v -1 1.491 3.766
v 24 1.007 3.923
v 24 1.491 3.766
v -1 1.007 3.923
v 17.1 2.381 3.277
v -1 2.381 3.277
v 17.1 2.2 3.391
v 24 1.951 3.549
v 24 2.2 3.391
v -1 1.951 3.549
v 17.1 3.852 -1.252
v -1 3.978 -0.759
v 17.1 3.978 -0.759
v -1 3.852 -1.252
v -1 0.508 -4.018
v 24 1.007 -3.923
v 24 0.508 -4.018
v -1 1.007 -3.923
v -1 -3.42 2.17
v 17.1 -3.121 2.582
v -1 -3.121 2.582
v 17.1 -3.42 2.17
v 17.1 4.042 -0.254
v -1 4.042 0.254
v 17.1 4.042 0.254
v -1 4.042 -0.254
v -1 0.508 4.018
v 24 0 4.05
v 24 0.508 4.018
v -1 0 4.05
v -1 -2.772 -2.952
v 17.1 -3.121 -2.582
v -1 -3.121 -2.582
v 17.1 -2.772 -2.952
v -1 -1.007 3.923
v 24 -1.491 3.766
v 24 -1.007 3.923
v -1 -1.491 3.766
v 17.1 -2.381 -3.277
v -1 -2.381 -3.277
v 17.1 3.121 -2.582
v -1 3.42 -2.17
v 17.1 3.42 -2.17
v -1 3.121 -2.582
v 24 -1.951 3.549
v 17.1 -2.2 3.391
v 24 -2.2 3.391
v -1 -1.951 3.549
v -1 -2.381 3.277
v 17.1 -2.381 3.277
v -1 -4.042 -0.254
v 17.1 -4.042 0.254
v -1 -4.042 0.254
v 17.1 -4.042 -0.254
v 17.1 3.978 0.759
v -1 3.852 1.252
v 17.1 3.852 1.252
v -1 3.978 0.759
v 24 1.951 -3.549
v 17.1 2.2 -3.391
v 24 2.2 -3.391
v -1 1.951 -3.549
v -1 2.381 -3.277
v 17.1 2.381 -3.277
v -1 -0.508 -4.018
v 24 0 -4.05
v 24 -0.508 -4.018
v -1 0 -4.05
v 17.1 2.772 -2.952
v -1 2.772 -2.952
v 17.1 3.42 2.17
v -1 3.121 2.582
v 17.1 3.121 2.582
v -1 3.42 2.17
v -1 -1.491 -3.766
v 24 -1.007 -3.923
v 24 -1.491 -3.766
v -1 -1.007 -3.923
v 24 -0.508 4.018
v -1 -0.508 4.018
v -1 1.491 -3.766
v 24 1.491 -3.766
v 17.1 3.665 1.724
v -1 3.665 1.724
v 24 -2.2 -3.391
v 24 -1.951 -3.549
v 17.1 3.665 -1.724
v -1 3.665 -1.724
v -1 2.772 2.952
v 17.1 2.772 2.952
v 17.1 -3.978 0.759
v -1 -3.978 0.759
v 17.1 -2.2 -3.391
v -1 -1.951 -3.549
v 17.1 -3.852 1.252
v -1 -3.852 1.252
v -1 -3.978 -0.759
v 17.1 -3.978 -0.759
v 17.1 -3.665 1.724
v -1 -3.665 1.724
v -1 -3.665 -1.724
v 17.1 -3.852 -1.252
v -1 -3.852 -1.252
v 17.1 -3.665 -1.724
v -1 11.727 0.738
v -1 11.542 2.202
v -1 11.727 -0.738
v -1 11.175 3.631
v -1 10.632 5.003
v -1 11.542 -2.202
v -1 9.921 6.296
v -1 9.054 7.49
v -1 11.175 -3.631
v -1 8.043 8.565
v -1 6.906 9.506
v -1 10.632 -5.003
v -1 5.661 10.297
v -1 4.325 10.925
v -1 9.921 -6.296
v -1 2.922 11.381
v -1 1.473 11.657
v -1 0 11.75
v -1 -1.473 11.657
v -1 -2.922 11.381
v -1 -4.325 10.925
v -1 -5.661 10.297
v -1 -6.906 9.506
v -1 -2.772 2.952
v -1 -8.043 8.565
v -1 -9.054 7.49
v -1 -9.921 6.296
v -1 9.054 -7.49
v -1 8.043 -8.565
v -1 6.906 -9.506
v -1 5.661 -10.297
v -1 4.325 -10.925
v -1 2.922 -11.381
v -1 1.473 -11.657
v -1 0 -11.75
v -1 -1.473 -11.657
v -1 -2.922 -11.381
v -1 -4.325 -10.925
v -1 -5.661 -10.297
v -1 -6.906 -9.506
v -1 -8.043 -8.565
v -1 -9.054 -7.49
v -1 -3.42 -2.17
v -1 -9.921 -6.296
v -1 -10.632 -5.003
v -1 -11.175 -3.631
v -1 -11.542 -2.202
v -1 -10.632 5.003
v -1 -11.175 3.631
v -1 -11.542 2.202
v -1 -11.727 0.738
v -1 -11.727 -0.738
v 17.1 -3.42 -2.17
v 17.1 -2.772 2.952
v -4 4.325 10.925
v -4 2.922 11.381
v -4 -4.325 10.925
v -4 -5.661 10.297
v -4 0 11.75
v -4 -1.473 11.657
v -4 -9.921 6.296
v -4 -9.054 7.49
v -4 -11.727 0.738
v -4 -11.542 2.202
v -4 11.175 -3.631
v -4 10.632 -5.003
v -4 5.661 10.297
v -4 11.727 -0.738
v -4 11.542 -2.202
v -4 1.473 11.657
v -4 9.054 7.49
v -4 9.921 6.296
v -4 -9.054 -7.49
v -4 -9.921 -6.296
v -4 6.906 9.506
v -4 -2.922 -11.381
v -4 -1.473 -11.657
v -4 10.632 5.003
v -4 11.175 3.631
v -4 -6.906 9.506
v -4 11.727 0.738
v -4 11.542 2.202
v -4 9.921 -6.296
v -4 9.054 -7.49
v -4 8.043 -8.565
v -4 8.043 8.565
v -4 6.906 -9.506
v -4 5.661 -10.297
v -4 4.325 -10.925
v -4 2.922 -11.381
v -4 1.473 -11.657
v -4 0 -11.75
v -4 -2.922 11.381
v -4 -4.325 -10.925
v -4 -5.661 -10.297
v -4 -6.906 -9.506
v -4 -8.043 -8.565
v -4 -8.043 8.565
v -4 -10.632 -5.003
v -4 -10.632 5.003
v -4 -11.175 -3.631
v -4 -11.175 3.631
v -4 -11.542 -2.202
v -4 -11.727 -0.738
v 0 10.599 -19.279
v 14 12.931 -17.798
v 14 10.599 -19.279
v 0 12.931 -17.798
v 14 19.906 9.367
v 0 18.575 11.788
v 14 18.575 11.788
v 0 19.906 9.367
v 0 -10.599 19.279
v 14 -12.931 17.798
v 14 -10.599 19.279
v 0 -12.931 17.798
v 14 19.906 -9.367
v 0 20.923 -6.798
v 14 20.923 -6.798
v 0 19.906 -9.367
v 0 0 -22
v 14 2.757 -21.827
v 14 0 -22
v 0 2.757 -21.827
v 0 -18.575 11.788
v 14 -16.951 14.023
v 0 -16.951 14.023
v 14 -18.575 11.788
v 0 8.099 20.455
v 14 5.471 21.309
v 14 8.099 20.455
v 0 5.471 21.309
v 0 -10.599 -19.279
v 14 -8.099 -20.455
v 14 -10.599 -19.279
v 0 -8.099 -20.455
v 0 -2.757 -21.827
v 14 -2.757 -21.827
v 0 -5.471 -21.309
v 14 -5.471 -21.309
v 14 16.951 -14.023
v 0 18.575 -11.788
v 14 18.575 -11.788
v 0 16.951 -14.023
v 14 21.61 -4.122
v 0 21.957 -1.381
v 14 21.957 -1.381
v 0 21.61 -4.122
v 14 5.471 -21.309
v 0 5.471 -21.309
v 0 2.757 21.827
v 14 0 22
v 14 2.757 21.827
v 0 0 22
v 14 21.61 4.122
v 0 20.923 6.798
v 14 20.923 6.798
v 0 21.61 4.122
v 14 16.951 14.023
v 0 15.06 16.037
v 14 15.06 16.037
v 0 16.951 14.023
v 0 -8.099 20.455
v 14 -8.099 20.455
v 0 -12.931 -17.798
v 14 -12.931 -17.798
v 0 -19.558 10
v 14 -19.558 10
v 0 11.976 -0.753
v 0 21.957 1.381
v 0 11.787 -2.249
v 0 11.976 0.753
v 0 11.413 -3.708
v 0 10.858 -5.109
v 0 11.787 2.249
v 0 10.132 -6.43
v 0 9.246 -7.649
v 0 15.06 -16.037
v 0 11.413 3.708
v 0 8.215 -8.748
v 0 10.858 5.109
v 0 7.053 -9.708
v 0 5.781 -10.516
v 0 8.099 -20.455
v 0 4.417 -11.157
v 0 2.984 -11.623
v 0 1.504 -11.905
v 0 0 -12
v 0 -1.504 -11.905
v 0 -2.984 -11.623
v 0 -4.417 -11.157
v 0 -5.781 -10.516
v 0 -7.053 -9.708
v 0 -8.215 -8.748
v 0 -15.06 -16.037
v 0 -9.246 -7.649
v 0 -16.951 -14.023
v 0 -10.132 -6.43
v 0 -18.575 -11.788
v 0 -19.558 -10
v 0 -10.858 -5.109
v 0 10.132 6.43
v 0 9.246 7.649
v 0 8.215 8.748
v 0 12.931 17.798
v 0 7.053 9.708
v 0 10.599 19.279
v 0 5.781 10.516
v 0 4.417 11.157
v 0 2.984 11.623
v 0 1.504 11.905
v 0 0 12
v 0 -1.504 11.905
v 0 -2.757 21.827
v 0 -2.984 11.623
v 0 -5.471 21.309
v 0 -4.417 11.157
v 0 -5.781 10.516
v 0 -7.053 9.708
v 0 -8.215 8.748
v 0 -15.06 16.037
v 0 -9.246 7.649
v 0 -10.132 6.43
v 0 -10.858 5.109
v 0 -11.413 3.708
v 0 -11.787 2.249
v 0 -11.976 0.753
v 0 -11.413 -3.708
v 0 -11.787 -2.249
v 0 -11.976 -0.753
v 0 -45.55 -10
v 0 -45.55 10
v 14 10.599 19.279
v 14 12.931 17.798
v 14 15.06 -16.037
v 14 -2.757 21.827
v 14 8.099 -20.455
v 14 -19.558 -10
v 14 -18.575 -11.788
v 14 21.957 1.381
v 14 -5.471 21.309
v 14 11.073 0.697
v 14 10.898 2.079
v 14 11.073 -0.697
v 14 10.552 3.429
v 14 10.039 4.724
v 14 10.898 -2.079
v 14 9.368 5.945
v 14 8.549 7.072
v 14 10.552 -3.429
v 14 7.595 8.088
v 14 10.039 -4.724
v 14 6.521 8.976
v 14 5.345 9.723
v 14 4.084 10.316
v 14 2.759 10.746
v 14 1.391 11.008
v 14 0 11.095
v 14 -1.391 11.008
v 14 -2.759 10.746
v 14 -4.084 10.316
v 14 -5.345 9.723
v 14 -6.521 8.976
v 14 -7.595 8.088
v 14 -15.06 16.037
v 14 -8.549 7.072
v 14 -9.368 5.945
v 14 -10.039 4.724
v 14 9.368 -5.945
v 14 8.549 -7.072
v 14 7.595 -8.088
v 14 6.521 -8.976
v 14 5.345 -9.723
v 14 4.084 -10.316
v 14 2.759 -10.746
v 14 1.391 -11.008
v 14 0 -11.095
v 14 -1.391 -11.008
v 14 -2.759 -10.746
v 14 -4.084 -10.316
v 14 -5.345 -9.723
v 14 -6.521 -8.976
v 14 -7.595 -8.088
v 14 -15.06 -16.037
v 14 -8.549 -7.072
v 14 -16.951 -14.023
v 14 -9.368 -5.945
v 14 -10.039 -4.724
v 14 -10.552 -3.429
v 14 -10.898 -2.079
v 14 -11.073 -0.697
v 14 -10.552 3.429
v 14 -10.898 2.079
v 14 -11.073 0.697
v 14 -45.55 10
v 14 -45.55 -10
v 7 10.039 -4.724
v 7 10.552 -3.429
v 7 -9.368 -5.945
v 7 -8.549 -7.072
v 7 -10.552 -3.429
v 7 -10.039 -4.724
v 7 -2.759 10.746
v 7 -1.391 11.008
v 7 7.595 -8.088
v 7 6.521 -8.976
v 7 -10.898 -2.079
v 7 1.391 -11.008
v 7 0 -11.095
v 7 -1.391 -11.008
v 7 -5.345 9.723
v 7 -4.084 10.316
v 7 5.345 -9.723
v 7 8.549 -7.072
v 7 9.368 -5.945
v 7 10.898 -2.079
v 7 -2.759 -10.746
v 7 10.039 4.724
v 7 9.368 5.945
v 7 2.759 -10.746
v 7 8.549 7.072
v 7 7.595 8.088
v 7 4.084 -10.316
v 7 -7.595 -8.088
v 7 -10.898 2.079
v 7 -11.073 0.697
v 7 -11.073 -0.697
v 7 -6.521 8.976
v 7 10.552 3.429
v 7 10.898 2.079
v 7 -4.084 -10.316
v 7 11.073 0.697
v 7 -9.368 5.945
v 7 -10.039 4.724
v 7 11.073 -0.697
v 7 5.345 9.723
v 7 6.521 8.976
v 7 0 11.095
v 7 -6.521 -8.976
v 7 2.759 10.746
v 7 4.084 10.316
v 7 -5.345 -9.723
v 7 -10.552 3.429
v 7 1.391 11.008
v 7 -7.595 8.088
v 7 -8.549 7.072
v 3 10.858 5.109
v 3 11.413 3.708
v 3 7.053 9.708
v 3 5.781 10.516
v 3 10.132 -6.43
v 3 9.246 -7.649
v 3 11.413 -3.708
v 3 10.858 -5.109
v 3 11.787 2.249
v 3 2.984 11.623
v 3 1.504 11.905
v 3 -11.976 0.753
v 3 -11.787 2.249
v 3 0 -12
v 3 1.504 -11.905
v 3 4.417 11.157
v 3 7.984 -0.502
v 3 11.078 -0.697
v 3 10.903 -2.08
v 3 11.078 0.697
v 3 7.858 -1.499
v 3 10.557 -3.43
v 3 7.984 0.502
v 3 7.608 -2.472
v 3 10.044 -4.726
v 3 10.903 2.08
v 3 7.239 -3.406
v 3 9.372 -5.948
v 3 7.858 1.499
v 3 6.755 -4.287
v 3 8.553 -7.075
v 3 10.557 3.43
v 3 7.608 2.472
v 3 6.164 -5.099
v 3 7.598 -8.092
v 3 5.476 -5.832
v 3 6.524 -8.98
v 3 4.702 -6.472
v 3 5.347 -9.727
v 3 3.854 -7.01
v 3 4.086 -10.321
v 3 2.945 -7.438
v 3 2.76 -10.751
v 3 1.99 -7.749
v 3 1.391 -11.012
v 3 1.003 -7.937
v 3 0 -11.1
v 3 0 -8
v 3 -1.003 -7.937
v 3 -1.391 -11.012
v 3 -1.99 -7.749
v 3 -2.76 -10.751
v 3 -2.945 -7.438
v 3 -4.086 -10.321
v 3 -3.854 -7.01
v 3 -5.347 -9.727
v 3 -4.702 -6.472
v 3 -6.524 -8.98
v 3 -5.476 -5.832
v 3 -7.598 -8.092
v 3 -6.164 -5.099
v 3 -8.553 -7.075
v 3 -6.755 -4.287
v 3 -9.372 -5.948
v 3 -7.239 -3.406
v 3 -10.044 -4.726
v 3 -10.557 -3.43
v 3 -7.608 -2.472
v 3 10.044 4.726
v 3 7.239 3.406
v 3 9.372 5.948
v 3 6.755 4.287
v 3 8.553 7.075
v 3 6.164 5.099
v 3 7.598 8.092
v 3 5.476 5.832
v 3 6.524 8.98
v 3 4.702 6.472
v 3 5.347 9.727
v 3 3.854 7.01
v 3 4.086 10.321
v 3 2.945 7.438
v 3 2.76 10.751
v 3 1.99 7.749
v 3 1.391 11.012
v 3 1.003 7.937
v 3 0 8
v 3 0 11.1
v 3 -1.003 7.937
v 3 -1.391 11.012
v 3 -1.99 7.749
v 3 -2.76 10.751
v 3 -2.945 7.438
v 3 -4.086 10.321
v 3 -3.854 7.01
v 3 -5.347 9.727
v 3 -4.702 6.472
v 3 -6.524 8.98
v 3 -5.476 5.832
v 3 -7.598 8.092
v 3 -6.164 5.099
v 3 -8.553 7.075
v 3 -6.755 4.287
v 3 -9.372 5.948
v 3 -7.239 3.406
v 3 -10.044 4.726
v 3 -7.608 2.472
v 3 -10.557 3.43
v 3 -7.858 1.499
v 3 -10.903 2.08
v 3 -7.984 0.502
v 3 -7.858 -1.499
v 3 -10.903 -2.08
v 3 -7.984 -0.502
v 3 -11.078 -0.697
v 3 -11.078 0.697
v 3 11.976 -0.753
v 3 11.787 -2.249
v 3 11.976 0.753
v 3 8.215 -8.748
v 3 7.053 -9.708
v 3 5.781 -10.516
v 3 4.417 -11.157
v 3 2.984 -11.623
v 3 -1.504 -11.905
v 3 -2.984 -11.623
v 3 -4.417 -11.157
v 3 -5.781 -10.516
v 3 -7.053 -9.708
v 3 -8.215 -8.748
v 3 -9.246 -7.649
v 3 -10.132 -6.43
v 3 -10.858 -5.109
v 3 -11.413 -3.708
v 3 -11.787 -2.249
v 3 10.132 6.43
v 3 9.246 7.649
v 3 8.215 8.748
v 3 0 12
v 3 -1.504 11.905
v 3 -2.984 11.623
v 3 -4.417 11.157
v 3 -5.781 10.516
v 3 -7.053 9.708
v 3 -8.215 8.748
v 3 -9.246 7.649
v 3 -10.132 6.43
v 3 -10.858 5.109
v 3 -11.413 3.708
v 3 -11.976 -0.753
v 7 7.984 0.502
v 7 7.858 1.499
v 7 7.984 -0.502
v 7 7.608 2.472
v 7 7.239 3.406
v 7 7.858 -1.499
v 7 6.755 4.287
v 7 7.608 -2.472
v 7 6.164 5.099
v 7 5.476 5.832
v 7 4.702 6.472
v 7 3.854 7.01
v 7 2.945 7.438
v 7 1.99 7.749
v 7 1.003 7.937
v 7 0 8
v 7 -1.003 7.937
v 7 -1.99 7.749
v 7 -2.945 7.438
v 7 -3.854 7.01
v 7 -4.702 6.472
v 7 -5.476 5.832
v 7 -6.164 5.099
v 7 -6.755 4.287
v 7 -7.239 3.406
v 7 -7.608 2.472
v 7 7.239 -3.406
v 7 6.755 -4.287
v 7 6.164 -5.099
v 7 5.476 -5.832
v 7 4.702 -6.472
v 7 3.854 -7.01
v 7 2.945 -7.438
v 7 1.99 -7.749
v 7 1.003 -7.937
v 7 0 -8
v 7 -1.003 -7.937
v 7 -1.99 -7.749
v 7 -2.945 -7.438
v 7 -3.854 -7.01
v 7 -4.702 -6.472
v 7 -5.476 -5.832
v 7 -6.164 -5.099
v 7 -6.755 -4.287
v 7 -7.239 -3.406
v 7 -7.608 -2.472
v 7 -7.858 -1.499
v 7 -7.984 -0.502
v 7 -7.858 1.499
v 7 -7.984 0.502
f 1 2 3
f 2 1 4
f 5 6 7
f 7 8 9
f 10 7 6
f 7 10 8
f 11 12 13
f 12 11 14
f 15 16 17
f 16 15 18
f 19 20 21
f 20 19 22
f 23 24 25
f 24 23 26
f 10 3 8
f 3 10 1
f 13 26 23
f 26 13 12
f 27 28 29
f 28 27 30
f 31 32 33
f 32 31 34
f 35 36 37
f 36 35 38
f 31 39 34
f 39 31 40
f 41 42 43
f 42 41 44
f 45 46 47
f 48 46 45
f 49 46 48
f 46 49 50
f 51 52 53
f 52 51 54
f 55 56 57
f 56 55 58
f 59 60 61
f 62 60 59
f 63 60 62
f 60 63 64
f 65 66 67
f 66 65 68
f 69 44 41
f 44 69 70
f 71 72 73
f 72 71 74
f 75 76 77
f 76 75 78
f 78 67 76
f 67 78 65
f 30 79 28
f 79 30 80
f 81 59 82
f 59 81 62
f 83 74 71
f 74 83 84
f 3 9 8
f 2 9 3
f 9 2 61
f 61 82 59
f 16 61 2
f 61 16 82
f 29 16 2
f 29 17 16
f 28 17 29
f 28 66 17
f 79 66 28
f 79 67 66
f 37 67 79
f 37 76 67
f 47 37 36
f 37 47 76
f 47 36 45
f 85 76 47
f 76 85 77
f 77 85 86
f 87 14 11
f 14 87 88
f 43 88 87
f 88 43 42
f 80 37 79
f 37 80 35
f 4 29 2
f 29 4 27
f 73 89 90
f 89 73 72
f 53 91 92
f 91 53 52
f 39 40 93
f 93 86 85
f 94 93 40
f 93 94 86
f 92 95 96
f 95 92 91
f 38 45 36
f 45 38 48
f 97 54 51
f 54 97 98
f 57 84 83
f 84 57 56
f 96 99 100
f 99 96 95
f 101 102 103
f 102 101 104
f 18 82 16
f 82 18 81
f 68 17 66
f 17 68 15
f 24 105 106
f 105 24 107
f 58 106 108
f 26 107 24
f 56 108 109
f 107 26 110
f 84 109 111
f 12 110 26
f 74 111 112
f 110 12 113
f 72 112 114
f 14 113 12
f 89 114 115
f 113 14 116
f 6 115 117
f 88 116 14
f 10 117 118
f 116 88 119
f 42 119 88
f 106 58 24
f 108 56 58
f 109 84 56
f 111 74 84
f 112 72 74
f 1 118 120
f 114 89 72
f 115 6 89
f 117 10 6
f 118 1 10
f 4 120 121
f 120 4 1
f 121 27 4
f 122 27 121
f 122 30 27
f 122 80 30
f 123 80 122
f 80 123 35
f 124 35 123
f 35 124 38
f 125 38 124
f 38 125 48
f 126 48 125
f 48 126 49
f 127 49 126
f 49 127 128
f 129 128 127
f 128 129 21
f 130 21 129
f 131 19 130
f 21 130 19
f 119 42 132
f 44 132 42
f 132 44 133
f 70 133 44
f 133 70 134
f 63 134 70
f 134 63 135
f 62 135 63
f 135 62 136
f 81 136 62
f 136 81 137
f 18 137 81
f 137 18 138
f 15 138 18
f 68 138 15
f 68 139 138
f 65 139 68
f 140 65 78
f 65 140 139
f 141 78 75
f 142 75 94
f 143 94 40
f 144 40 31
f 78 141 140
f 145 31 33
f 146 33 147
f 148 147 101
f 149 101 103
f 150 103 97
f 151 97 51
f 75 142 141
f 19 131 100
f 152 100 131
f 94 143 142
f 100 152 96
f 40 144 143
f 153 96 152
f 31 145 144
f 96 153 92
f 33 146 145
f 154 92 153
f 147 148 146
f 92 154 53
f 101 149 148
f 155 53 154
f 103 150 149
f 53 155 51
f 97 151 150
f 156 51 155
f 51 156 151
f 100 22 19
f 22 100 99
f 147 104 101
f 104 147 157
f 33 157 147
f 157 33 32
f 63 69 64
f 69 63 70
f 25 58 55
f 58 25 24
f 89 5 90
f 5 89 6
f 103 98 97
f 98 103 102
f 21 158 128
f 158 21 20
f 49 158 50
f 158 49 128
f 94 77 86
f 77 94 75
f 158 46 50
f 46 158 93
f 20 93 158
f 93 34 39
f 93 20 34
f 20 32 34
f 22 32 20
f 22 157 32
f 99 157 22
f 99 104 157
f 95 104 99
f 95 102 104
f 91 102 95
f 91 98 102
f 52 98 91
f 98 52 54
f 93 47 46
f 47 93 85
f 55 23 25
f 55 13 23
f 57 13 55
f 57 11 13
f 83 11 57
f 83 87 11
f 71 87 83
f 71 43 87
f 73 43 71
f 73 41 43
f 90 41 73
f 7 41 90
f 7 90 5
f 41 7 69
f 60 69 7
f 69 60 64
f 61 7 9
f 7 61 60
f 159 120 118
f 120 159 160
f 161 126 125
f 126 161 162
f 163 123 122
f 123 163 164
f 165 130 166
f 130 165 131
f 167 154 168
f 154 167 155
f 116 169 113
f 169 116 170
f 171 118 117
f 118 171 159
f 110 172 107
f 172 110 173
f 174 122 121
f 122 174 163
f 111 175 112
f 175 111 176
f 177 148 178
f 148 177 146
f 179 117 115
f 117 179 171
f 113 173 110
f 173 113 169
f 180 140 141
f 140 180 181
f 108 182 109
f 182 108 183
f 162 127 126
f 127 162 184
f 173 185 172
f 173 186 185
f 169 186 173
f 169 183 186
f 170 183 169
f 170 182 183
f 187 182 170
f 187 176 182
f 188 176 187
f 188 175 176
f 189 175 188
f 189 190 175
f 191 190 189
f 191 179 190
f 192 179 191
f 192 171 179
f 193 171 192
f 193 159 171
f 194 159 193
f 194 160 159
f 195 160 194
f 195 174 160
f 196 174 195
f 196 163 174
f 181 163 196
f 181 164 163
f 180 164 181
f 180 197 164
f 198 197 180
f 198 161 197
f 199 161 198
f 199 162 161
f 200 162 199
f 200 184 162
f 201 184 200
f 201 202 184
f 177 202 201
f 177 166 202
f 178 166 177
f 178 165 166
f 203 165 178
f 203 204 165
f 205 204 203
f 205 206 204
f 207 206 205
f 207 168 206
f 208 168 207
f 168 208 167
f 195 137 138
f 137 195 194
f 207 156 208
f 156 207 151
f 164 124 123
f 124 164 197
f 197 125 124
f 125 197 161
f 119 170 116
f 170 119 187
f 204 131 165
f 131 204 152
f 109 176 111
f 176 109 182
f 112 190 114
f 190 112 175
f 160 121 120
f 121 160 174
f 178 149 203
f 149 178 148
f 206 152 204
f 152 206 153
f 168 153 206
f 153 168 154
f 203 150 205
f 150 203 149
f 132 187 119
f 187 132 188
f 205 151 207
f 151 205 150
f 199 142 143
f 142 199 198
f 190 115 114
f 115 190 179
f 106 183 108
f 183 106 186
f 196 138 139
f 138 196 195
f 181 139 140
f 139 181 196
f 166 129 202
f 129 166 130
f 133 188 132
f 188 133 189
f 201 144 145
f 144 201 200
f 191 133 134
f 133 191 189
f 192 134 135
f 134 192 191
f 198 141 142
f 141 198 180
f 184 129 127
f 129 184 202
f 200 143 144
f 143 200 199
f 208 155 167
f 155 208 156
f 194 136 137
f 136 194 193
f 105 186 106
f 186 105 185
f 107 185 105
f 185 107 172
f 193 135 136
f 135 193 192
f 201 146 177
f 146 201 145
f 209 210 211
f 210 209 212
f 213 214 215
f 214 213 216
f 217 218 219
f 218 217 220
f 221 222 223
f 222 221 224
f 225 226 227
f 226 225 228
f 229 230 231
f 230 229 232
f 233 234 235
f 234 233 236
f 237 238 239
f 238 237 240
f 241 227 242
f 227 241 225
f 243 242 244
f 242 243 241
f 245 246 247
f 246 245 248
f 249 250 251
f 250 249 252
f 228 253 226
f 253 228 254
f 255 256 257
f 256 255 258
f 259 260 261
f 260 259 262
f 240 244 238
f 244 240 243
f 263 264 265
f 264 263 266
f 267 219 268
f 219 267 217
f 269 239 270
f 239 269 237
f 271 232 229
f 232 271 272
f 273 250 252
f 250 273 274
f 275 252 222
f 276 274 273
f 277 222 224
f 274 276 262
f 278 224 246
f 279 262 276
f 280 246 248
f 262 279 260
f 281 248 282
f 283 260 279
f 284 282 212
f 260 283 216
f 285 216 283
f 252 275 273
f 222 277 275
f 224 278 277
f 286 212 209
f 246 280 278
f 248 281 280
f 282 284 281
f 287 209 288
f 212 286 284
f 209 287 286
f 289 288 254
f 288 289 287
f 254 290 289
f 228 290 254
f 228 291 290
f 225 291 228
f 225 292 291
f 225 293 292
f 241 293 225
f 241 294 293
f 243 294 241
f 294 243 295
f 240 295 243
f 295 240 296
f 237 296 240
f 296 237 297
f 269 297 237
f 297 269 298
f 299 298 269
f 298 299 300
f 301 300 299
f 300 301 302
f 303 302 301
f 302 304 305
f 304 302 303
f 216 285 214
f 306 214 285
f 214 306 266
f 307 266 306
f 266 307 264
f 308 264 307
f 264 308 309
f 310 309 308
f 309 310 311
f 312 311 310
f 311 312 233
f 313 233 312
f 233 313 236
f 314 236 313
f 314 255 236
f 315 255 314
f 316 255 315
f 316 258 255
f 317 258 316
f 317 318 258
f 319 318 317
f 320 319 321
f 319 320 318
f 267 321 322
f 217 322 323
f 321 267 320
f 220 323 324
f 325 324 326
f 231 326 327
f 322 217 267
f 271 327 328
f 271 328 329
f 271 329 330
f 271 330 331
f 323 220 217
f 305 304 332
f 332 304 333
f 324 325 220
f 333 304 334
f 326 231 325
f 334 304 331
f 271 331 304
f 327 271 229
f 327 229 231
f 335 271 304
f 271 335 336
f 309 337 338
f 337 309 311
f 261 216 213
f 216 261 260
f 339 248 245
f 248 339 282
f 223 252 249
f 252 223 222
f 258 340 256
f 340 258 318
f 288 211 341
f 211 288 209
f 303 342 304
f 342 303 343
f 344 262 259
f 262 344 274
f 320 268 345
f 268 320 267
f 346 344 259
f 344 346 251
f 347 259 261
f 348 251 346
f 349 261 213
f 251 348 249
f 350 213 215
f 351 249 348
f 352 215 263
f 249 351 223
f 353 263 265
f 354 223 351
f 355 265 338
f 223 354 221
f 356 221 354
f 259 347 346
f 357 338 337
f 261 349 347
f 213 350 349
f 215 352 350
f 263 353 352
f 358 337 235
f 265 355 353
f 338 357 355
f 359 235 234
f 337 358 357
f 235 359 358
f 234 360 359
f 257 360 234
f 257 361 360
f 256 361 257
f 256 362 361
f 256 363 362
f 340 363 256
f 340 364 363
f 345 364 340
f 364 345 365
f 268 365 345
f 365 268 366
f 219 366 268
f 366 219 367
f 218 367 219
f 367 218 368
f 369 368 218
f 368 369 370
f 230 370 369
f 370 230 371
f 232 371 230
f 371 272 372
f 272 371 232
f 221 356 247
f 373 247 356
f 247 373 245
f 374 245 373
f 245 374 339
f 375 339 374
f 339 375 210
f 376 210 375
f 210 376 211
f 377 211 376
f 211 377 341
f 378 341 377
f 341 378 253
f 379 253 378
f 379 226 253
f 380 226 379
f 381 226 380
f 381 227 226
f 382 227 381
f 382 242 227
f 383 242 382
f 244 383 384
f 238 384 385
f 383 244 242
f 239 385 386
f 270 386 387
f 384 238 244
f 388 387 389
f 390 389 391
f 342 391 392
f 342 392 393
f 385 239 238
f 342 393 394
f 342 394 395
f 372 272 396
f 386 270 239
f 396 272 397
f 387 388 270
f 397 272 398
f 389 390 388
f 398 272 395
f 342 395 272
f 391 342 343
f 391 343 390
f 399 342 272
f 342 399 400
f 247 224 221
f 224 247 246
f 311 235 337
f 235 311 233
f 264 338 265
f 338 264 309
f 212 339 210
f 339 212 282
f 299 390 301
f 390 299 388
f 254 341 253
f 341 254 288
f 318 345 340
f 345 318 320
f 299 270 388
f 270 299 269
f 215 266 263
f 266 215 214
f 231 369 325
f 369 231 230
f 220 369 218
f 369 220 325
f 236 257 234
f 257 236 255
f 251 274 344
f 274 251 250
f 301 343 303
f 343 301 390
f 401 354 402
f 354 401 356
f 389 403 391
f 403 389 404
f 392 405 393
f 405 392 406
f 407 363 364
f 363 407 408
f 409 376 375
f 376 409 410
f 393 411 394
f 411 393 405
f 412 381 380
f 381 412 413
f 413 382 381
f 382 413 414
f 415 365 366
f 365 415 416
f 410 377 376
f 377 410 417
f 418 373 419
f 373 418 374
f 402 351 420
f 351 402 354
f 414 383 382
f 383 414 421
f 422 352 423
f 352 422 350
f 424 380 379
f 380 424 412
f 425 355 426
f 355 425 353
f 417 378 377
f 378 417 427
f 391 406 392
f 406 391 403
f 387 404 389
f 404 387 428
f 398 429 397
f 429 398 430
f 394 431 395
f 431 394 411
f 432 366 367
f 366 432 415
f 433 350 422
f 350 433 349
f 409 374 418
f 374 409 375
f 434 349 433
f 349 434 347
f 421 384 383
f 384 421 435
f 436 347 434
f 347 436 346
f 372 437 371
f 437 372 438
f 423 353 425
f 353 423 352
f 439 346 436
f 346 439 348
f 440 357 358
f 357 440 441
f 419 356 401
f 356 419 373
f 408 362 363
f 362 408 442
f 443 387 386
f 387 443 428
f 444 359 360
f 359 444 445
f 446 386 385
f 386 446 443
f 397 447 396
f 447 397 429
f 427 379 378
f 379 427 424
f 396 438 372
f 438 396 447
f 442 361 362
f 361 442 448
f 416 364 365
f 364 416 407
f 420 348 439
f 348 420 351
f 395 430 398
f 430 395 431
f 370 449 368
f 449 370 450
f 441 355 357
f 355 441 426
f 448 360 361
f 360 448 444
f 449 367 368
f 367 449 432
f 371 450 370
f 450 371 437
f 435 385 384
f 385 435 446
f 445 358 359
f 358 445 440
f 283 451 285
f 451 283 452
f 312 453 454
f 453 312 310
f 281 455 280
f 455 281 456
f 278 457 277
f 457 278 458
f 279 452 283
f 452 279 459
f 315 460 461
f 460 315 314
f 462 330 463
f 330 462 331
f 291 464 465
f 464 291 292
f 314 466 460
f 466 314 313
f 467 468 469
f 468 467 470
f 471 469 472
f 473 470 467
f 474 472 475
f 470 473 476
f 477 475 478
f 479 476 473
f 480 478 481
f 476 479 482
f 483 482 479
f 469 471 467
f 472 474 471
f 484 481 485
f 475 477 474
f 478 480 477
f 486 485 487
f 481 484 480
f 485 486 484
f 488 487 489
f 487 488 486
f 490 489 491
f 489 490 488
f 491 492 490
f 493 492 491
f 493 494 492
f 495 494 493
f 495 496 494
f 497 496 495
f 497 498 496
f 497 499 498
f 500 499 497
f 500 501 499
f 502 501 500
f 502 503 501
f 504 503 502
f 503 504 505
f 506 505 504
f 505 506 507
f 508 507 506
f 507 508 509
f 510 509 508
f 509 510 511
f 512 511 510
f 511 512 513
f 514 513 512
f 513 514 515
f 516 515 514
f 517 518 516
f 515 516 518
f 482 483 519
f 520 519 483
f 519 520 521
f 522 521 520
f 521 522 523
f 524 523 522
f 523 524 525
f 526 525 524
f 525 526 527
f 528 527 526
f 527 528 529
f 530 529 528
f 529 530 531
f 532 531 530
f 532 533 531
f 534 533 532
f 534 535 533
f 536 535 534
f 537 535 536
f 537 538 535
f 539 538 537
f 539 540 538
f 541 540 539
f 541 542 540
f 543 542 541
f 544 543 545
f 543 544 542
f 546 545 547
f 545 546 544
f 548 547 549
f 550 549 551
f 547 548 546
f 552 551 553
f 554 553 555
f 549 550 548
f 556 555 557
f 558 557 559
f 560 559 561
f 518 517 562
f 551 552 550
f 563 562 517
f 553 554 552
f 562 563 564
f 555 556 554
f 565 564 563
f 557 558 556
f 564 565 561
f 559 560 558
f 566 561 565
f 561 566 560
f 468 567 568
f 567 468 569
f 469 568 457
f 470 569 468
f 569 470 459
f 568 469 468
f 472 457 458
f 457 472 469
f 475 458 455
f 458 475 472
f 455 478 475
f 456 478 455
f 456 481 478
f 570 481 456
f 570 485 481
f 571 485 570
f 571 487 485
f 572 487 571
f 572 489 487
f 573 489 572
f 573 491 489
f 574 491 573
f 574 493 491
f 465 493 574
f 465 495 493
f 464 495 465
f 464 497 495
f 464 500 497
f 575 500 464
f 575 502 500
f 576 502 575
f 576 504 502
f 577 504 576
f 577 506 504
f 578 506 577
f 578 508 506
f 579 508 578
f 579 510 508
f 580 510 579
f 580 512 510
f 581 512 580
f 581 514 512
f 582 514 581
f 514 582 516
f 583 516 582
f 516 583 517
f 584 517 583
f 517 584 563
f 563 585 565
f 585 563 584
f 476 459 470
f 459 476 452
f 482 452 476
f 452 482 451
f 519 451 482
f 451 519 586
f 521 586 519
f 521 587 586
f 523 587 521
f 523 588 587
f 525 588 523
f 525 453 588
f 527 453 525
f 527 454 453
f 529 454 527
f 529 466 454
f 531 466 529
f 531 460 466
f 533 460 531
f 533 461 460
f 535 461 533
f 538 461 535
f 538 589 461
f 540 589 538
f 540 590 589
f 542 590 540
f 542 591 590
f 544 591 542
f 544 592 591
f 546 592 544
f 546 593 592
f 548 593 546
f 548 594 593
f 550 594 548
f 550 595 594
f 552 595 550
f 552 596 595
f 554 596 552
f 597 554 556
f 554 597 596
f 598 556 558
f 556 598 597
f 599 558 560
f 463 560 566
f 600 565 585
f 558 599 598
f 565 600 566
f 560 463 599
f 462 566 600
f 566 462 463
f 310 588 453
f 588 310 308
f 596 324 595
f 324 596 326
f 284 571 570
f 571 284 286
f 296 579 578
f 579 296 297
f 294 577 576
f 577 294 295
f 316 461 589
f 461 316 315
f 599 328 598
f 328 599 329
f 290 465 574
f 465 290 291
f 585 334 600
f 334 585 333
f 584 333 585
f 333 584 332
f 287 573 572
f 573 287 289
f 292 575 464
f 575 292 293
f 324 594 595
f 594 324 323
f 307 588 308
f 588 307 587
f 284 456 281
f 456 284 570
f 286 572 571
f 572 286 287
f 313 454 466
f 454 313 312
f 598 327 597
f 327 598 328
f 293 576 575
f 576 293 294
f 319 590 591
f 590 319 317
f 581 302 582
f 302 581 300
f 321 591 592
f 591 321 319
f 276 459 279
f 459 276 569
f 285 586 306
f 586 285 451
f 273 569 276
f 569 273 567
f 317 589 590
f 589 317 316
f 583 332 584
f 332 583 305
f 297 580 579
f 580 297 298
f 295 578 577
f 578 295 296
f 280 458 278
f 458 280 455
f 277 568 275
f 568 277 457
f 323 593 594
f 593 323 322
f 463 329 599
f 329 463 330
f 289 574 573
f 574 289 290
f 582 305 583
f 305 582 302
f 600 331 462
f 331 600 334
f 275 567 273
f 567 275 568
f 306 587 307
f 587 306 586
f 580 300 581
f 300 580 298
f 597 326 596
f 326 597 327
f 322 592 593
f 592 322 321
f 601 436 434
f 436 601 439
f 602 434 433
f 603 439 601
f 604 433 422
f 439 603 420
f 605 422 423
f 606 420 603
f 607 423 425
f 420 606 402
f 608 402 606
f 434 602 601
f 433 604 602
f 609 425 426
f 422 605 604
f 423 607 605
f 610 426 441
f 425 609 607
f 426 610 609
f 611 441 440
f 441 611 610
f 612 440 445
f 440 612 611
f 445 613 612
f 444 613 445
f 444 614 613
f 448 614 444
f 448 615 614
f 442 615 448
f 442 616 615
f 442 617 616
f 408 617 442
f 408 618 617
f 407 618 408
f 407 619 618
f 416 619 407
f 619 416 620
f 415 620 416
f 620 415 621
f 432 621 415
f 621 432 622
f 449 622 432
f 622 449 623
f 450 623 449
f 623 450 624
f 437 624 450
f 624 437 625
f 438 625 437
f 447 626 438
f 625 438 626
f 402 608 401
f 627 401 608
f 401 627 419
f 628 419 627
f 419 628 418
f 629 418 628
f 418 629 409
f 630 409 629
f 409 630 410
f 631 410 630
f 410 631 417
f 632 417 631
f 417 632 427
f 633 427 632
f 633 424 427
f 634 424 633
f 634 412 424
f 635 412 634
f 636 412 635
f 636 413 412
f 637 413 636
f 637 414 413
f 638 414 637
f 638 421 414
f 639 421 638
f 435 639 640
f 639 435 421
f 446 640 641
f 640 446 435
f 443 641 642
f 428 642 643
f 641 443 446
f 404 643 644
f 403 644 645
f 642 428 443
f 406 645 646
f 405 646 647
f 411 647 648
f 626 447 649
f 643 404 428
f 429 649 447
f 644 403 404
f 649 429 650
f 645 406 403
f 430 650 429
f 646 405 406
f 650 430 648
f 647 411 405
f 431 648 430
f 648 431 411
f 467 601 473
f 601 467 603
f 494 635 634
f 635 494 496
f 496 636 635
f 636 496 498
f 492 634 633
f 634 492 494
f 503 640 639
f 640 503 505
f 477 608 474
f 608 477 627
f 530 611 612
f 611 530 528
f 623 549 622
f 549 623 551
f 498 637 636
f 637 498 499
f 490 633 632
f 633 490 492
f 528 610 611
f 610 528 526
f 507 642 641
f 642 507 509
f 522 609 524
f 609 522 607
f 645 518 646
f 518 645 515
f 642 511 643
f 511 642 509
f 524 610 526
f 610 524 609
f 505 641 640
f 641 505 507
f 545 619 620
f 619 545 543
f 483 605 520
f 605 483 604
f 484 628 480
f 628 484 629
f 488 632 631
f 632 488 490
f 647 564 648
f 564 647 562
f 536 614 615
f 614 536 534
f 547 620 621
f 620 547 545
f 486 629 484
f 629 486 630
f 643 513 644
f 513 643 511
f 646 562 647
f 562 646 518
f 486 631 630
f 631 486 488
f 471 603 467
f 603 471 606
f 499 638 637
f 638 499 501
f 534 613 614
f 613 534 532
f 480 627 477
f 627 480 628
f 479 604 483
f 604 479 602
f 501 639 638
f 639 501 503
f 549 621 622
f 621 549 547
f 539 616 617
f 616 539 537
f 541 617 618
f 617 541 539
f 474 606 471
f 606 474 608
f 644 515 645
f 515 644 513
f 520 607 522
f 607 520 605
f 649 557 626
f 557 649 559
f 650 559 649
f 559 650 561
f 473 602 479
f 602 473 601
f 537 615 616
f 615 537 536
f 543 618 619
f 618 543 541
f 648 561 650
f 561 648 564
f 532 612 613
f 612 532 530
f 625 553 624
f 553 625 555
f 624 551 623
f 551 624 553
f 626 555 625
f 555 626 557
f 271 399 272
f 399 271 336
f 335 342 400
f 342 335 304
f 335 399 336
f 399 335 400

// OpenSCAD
// file: ../spring_library.scad
/**
* An edge (or line) between 2 nodes
*/
module line(start, end, d, fn=4) {
  hull() {
    node(start,d, fn);
    node(end,d, fn);
  }      
}

/**
* A single node which is connected by edges
*/
module node(pos, d, fn=4) {
  if (pos[0]!=undef && pos[1] != undef && pos[2] != undef){ 
    translate(pos) sphere(d=d, $fn = fn);    
  }
}

/**
* Basic logic for generating a 3d spring
*/ 
module spring(d, dBottom=6, dTop=6, windings=2, height=10, steps=10, wireDiameter=1,fn=10) {
    // we use either d or dBottom&dTop
    r0 = d != undef ? d/2 : dBottom/2;
    r1 = d != undef ?d/2 : dTop/2;
    
    rx = (r0-r1) / (360.0*windings);    
    heightPerDegree = height/windings/360;
    
    for ( angle = [steps : steps : 360*windings] ){
        r = r0 - (angle * rx); 
        x0=r*cos(angle-steps);
        y0=r*sin(angle-steps);
        z0=(angle-steps)*heightPerDegree;
        x=r*cos(angle);
        y=r*sin(angle);
        z=angle*heightPerDegree;

        line([x0,y0,z0],[x,y,z],d=wireDiameter,fn=fn);        
    }
}

/**
* 3D Spring with identical diameter at top and bottom. The top and boton might
* start with a flat circle
*/
module spring3D(d=5,windings=3,height=10,flatStart=true,flatEnd=true, wireDiameter=1,  fn=4) {  
    spring(d=d, windings=windings,height=height, fn=fn);
    
    if (flatStart)
        spring(dBottom=d,dTop=d,windings=1,height=0, fn=fn);
    if (flatEnd)
        translate([0,0,height]) spring(dBottom=d,dTop=d, windings=1,height=0, fn=fn);

}

/**
* Generate Support for the 3D Spring
*/
module spring3DSupport(d=5,height=10,supportDiameter=0.6, fn=4){
    // generate support
    dist=(d/2)*cos(0);
    translate([0,-dist,0])  cylinder(h=height,d=supportDiameter, $fn=fn);
    translate([0,dist,0])  cylinder(h=height,d=supportDiameter, $fn=fn);
}

/**
* Flat "clock" Spring
*/
module springSpiralTorsion(d=15,innerD=6, windings=5,wireDiameter=0.7,fn=4) {
    // outer ring
    spring(dBottom=d,dTop=d,windings=1,height=0,wireDiameter=wireDiameter,fn=fn);
    // windings
    spring(dBottom=d,dTop=innerD,windings=windings,height=0,wireDiameter=wireDiameter,fn=fn);
    // inner ring
    spring(dBottom=innerD,dTop=innerD,windings=1,height=0,wireDiameter=wireDiameter,fn=fn);
}

/**
* Flat 2d Spring with a sinusoidal shape
*/ 
module springSine(length=20, width=10, windings=4, steps=10, wireDiameter=0.7, fn=4){
    dx = length / (360 * windings);
    for(i = [steps : steps : 360 * windings]){
        x0 = (i-steps) * dx;
        y0 = sin(i-steps) * width/2;
        x = i * dx;
        y = sin(i) * width/2;        
        line([x0,y0,0],[x,y,0],d=wireDiameter,fn=fn);        
    }
}

/**
* Flat 2d Spring with a triangular shape
*/
module springTriangle(length=20, width=10, windings=4, wireDiameter=0.7, fn=4){
    // generate poins only every 90 degrees
    springSine(length=length,width=width, windings=windings, steps=90, wireDiameter=wireDiameter,fn=fn);
}

/**
* An edge (or line) between 2 cylinders
*/
module line3D(start, end,d=1,h=10, fn=4) {
  hull() {
    translate(start) cylinder(h=h, d=d, $fn = fn);    
    translate(end) cylinder(h=h, d=d, $fn = fn);    
  }      
}

/**
* 3d Spring with a sinusoidal shape
*/ 
module springSine3D(length=20, heigth=10, width=10, windings=4, steps=10, wireDiameter=0.7, fn=4){
    dx = length / (360 * windings);
    for(i = [steps : steps : 360 * windings]){
        x0 = (i-steps) * dx;
        y0 = sin(i-steps) * width/2;
        x = i * dx;
        y = sin(i) * width/2;        
        line3D([x0,y0,0],[x,y,0],d=wireDiameter,h=heigth, fn=fn);  
    }
}

/**
* 3d Spring - we generate an hollow Ellipse
*/ 
module springLeaf(width=3,len=10,height=5,thickness=1){
 rotate([90, 0, 90])
  scale([len/10,height/10,1]) 
  difference() {
     cylinder(h=width, r=10, center=true);
     cylinder(h=width+2, r=10-thickness, center=true);
  }
}

//spring3D();
//spring3DSupport();
//springSine3D();
//springTriangle();
//springSpiralTorsion();
springLeaf(3, 30, 2, 1);
// file: physical_ball_bearing.scad
include <../robot_settings.scad>

$fs = .1;

module physical_ball_bearing() {
  difference() {
   color("green")
  cylinder(h = ball_bearing_height, d = ball_bearing_outer_diameter, center = true);
  translate([0,0, -.2]);
    cylinder(h = ball_bearing_height + .1, d = ball_bearing_inner_diameter, center = true);
  }
}
physical_ball_bearing();
// file: pull_bar.scad
include <../robot_settings.scad>
$fn = 50;

module pull_bar(rotateit = false, bar_length_offset = 0) {
    rotation = rotateit ? 180 : 0;
  
    rotate([0,rotation,0])
    {
        // push bar
        difference() {
            rotate([0, 90, 0])
            cylinder(h = pull_bar_length + bar_length_offset, r = pull_bar_peg_r);
            translate([-.5, 0, -pull_bar_peg_r])
            cylinder(h = 2 * pull_bar_peg_r, r = pull_bar_peg_r);
          }
          
           if (rotation == 0 ){
              translate([pull_bar_length + bar_length_offset + 2 * pull_bar_peg_r - 2.2,  -pull_bar_peg_r - 1.8, -0.5])
              cube([1.9, 2.8, 1]);
           }
          else
          {
              translate([pull_bar_length + bar_length_offset + 2 * pull_bar_peg_r - 2.2,  -pull_bar_peg_r - 1.8, -0.5])
              cube([1.9, 2.8, 1]);
           }
           
          // rack fitting
          translate([pull_bar_length + bar_length_offset - .1, 0, 0])
            rotate([0, 90 ,0])
            cylinder(h = 2 * pull_bar_peg_r - .2, d = 2 * pull_bar_peg_r);

          // grabber
          translate([-.5, 0, -1.1])
          difference() {
              translate([0, 0, 1 - pull_bar_peg_r])
              cylinder(h = 2 * pull_bar_peg_r, r = pull_bar_peg_r + 1);
          
              translate([0, 0,  -pull_bar_peg_r])
              cylinder(h = 3* pull_bar_peg_r, r = pull_bar_peg_r);
         }
    }
                

}
pull_bar();
// file: axle_for_custom_hub.scad
include <../robot_settings.scad>

$fn=50;

module axle(
  axle_length = axle_length,
  axle_inner_radius = (axle_reciever_inner_diameter- 0.1) / 2 ,
  rotate = true,
  rear_axle = false
)
{
  cutout1 = -axle_notch_cutout;
  cutout2 = axle_notch_cutout;
  
   rotation = rotate ? 180 : 0;
      
  rotate([0,rotation,0])
  {
    
    // inner axle
    difference() {
        // axle
       rotate([0,90,0])
       cylinder(axle_length, r = axle_inner_radius);
      
      // axle notch
       translate([-.1, cutout1 -axle_inner_radius + .2, -axle_inner_radius])
       cube([axle_notch_length, axle_inner_radius, 2 * axle_inner_radius]);
      
       translate([ -.1, cutout2 - .2, -axle_inner_radius])
       cube([axle_notch_length,  axle_inner_radius, 2 * axle_inner_radius]);    
      
        translate([axle_length + .1, 0, 0])
   
        if (rear_axle) {
          // carve out the engine axle insert
          rotate([0, -90, 0])
            cylinder(h = dc_motor_axle_cutout_z, d = dc_motor_axle_cutout_d);          
        }
      }

      // 
      if (!rear_axle) {
        
          // axle cap
          translate([axle_length, 0, 0])
           rotate([0,90,0])
          cylinder(h = 3, d = ball_bearing_outer_diameter + 1.5);
      }
      else {
        
        // engine axle notch
        translate([
            axle_length - 7, 
            -dc_motor_axle_notch_cutout - 1.5,
            0
          ])
          cube([
            dc_motor_axle_cutout_z, 
            dc_motor_axle_notch_cutout + 1, 
            dc_motor_axle_notch_cutout_z -.7], center = true); 
      }
  }
}
 
axle();
// file: ../apparatus_pegs.scad
include <robot_settings.scad>
$fn=50;
  
 print_front_rack_grab_bar_peg = true;
 print_apparatus_peg = false;
  

// this applies to all locking pegs
module apparatus_peg()
{
  translate([20, 0, 0])
  cylinder(h = ball_bearing_outer_diameter + 2, 
      d = apparatus_locking_peg_d - .2, center = true);
}
if (print_apparatus_peg)
    apparatus_peg();

// this applies to the front grab bar
module front_rack_grab_bar_peg()
{
  translate([40, 0, 0])
   cylinder(h = armature_holder_height + 8, 
      r = pull_bar_peg_r - .24, center = true);
  
  translate([37.5, -1, armature_holder_height / 2 + 3.3])
  linear_extrude(2)
  text(".24", size = 2.5);
}
if (print_front_rack_grab_bar_peg)
  front_rack_grab_bar_peg();
// file: ../robot_settings.scad
main_box_x = 95; // 96
main_box_y = 102;
main_box_z = 74; // 74.5
wall_thickness = 2;

rail_gap = 2;
rail_inset = 7;

rail_thickness = 7;
rail_length = 250;
rail_width = 200;

raspberry_pi_screw_seperation_y = 57;
raspberry_pi_screw_seperation_z = 48;
raspberry_pi_peg_h = 5;

battery_box_peg_h = 6;
battery_box_peg_d = 8;
battery_box_peg_cutout = 5;

gears_module = 1;
pinion_gear_teeth = 32;
pinion_gear_width = 5;
pinion_gear_bore = 8;

gears_setback_distance = 25;
gear_post_height = 2 * pinion_gear_width + rail_thickness + 8 ;

steering_motor_mount_x = 45;
steering_motor_mount_y = 36;
steering_motor_mount_z = 18;
steering_motor_mount_setback_distance = gears_setback_distance + 16;

dc_motor_drivertype = "Teyleten"; // Teyleten
isAdafruit = (dc_motor_drivertype == "Adafruit");

drv8871_x = isAdafruit ? 20.3 : 21.6;
drv8871_y = isAdafruit ?  24 : 25;

drv8871_z = 2;
drv8871_screw_d = 2.5;
drv8871_solder_points_z = 2;

drv8871mount_edge_x = 1.5;
drv8871mount_edge_wall = 3;
drv8871mount_z = 5;
drv8871mount_x = drv8871_x +  drv8871mount_edge_wall - 2* drv8871mount_edge_x;
drv8871mount_y = 19;

drv8871_screw_distance = 15.64;
drv8871_solder_points_d = 1.66;
drv8871_solder_offset_y = 4.4;
drv8871_solder_inner_points_distance = 5;
drv8871_solder_outer_points_distance = 12;

dc_motor_housing_minus_encoder_z = 48;
dc_motor_encoder_z = 9.33;
dc_motor_encoder_wheel_d = 13.4;
dc_motor_encoder_wheel_thickness = 5;
dc_motor_encoder_wheel_gap = 3;
dc_motor_encoder_circuit_thickness = 2;
dc_motor_cutout_d = 24.8;
dc_motor_cutout_z = 19.5;

dc_motor_screw_head_z = 2;
dc_motor_screw_head_d = 5.6;
dc_motor_screw_d = 3.2;
dc_motor_screw_offset = 8.5;

dc_motor_axle_ring_z = 3;
dc_motor_axle_ring_d = 7.2;
dc_motor_axle_cutout_d = 4.2;
dc_motor_axle_cutout_z = 10;
dc_motor_axle_notch_cutout = 0.4;
dc_motor_axle_notch_cutout_z = 6;

pdmount_x = 20;
pdmount_y = 30;
pdmount_z = 2;
pdmount_edge_x = 1.5;
pdmount_edge_wall = 3;

steering_shaft_z = 45;
steering_shaft_d = 7;
steering_shaft_motor_fitting_d = 9;
coupler_length = 24.6;
coupler_diameter = 14;
coupler_screw_d = 4;
coupler_screw_z_offset = 5;
coupler_gear_side_insert = 12.6;
steering_shaft_with_coupler_z = steering_shaft_z - coupler_gear_side_insert;

lidar_mount_y = 110;
lidar_mount_x = 65 + 20;
lidar_narrow_screws = 40;
lidar_wide_screws = 56;
lidar_front_to_back_screws = 70;
lidar_screw_d = 3;
lidar_circuitboard_x = 20;
lidar_circuitboard_y = 35;
lidar_circuitboard_z = 1.2;
lidar_cord_length = 29;

ball_bearing_height = 7;
ball_bearing_outer_diameter = 22;
ball_bearing_inner_diameter = 8;

M4_diameter = 5.1;
M3_diameter = 2.9;
M3_length = 35;
M3_cap_length= 3;
M3_cap_diameter = 5.44;

suspension_spring_outer_diameter = 8;
suspension_spring_inner_diameter = 5.3;

armature_holder_height = 20;
armature_holder_thickness = 8;
pull_bar_peg_r = 3.2;
apparatus_locking_peg_d = 4;

rack_module = 1;
rack_length = main_box_x;
rack_height = 5;
rack_width = 10;
rack_teeth = 30;
rack_bore = 3;

pull_bar_length = rail_width / 2 - rack_length + 1;

// tire hardware
axle_length = 24; 
axle_reciever_inner_diameter = 8.2;
axle_reciever_outer_diameter = 12;
axle_reciever_length = 18.8;
axle_notch_length = 7;
axle_notch_cutout = 2.4;

// power distribution bar
power_bar_cutout_x = 96;
power_bar_y = 19.1;
power_bar_z = 1.5;
power_bar_screw_distance = 91.4;
power_bar_screw_d = 2.8;
power_bar_standoff_z = 5;
power_bar_standoff_d = 6.83;

pico_expander_width = 63;
pico_expander_height = 57;
pico_screw_hole_offset = 3;
pico_screw_hole_d = 2.5;

usbhub_thickness = 11.7;
usbhub_depth = 37.5;
usbhub_width = 86.7;
usbhub_end_port_width = 14.8;
usbhub_end_port_height = 12;
usbhub_front_face_safe_zone_left = 15;
usbhub_front_face_safe_zone_right = 14.8;

switch_w = 16;
switch_cutout_d = 12.2;
switch_bump_h = 2;
switch_bump_l = 18.2;
// main file
include <../robot_settings.scad>

use <../apparatus_pegs.scad>
use <axle_for_custom_hub.scad>
use <pull_bar.scad>
use <physical_ball_bearing.scad>
use <../spring_library.scad>
$fn = 50;

module tire_apparatus(
  axle_length = 17,
  axle_rotation = true, // true is left side
  armature_holder_width = 28,
  pull_bar_length = 25,

  include_ball_bearing = false,
  include_apparatus = true,
  include_axle = true
) 
{  
  

  if (include_axle) {
    // axle_rotation is half handled here and half inside axle()
    offset = axle_rotation ? axle_length + 1 * ball_bearing_height : -10;
    color("blue")
    translate([offset, 0, 0])
      axle(axle_length = axle_length + 8, rotate = axle_rotation, rear_axle = false);
  }

  if (include_ball_bearing) {
    
    // ball bearing for tire
    
    translate([ball_bearing_height / 2, 0, 0])
    rotate([0, 90, 0])
    physical_ball_bearing();

  }

if (include_apparatus) {
    translate([0, -8, 0])
    {
      // armature location
       armature_edge = armature_holder_width +  19.1 / 2;
       flip = 1;
        
       // armature
        translate([0,  - armature_edge,  -armature_holder_height / 2])
        cube([2 * ball_bearing_height , armature_holder_width, armature_holder_height]);
    }
   
      // ball bearing housing wheel
    
     difference() {
        translate([0, 0, 0])
        rotate([0, 90, 0])
        cylinder(h = 2 * ball_bearing_height, d = 2 * ball_bearing_outer_diameter);
       
        translate([-1.5, 0, 0])
        rotate([0, 90, 0])
        cylinder(h = 3 * ball_bearing_height, d = ball_bearing_outer_diameter + .19);  

       translate([-.1, 0, 0])
        rotate([0, 90, 0])
        cylinder(h = 3.1, d = ball_bearing_outer_diameter + 2);
      }
        
      // add a little ring inside for the ball bearing and axle cap so it snuggly fits on wheel side
      translate([3, 0, 0])
      rotate([0, 90, 0])
      {
        difference() {
          cylinder(h = ball_bearing_height - 3, d = ball_bearing_outer_diameter + .2);
          translate([0, 0 , -1])
          cylinder(h = ball_bearing_height + 2, d = 2 * ball_bearing_inner_diameter);
        }
     }
   }
 }
tire_apparatus();
